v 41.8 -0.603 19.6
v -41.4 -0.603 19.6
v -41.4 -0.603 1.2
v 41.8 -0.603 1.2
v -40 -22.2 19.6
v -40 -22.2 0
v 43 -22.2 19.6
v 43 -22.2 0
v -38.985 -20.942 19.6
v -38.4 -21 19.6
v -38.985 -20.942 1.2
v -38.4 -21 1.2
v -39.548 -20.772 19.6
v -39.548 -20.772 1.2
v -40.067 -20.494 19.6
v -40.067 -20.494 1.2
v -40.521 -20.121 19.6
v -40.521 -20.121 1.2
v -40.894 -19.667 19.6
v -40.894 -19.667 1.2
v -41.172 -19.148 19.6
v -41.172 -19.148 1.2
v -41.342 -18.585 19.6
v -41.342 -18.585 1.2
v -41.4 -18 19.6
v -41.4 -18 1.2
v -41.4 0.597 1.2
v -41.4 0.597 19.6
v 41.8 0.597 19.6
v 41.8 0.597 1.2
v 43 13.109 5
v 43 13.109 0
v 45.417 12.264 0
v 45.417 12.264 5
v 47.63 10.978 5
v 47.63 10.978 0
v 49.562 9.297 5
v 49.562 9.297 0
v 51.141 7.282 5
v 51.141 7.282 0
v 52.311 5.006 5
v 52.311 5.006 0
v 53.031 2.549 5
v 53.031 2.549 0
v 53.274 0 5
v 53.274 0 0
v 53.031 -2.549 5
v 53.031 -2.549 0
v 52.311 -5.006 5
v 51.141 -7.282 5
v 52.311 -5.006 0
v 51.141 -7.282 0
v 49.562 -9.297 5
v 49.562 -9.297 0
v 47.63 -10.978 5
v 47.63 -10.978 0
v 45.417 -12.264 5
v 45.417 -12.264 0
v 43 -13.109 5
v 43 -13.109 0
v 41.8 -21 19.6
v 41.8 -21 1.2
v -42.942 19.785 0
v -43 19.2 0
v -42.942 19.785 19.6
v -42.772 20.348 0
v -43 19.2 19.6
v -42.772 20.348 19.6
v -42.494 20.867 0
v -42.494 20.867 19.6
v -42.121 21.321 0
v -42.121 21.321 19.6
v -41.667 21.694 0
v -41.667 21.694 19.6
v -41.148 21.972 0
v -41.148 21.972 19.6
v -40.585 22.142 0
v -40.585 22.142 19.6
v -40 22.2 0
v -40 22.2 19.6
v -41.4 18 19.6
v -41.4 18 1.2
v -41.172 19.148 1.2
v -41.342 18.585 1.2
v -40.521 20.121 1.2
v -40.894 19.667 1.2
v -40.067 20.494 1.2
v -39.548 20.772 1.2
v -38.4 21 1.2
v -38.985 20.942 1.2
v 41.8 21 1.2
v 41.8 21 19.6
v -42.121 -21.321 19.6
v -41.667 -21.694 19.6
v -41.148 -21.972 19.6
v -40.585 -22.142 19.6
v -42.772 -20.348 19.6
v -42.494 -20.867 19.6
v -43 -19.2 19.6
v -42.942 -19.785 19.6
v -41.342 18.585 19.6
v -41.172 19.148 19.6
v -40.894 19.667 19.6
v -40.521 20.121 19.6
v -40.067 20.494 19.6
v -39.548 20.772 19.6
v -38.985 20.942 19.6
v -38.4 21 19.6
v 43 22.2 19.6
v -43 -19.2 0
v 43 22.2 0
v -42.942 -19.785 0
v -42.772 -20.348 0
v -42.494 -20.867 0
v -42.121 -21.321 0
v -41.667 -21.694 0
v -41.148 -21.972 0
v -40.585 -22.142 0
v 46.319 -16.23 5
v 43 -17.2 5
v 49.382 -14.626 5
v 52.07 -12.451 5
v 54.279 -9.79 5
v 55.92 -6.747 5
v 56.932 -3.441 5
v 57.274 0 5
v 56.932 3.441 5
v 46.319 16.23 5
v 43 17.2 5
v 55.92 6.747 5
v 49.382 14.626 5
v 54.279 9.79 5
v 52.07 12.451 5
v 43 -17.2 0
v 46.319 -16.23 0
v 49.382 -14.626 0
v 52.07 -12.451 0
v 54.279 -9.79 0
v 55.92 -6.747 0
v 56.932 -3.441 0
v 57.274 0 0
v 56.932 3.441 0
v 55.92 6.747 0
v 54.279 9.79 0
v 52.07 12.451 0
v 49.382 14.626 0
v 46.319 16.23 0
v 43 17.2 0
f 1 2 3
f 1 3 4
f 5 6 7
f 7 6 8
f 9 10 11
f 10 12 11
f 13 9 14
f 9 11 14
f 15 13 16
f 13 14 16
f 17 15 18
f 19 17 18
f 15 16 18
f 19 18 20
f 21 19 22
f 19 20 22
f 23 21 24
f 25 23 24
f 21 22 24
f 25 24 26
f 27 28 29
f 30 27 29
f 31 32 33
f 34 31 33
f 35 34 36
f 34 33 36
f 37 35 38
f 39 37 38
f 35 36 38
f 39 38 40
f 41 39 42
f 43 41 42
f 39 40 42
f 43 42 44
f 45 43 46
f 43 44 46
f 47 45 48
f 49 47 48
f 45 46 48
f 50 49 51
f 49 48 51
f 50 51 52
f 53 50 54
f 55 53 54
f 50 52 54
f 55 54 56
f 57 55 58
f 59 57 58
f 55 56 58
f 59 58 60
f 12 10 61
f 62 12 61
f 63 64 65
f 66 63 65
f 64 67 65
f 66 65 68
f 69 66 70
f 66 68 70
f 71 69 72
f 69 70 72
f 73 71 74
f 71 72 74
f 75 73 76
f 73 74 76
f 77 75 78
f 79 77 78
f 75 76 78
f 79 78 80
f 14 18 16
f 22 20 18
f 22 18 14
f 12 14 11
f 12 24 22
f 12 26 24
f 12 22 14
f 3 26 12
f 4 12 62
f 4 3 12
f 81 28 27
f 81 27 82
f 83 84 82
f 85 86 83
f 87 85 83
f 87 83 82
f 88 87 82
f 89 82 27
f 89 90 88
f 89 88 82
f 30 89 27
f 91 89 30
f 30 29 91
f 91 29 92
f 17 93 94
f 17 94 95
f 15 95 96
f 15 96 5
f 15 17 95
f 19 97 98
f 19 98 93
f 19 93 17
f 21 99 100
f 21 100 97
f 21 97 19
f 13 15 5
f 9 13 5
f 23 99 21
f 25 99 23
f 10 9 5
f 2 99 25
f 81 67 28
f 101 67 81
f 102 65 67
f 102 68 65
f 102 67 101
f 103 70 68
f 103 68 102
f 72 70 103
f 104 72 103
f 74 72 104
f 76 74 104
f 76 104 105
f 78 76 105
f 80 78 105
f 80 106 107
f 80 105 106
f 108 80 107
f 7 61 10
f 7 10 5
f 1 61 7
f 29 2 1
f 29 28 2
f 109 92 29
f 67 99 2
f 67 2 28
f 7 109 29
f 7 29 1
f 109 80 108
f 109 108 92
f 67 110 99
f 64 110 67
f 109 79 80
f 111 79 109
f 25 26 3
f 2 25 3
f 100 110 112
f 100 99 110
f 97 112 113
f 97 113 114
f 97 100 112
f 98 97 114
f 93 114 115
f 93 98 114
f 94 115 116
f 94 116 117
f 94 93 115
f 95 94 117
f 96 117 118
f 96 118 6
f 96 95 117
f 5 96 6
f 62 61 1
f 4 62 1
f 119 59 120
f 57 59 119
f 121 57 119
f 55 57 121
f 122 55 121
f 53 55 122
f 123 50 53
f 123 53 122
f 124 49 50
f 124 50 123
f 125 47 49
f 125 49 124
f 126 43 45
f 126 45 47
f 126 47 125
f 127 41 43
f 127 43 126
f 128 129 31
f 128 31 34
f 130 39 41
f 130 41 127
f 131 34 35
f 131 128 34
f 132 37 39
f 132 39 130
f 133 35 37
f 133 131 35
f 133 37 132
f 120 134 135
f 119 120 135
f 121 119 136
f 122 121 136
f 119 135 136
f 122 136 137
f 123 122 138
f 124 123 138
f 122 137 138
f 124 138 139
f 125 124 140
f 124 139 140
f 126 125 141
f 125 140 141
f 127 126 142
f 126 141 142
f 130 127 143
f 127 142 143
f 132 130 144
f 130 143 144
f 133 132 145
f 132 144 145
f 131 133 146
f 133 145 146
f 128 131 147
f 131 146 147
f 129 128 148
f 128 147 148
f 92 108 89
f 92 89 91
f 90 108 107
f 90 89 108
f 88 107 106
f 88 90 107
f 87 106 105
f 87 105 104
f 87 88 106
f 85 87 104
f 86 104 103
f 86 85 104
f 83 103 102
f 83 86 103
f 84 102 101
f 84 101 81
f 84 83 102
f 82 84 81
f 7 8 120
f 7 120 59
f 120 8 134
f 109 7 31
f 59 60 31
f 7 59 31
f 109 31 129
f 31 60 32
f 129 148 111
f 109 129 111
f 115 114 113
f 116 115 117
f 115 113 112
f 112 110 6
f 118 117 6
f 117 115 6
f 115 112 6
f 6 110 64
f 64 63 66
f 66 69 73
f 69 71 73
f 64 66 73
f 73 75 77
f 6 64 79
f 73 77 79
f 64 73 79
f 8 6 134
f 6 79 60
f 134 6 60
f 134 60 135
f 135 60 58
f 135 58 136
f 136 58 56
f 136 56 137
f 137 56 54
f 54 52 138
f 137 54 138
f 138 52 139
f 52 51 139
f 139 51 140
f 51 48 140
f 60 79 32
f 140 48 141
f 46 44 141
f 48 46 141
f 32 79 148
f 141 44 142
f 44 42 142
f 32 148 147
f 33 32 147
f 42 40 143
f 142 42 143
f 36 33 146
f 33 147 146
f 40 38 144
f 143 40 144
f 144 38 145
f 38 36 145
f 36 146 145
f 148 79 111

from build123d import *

# Parameters (mm, degrees)
SKETCH_1_W          = 86
SKETCH_1_H          = 44.4
EXTRUDE_1_DEPTH     = 19.6
EXTRUDE_2_DEPTH     = 5
SKETCH_3_W          = 83.2
SKETCH_3_H          = 20.402884615
SKETCH_3_H_2        = 20.397115385
CUT_EXTRUDE_1_DEPTH = 18.4
FILLET_1_R          = 3


with BuildPart() as part:
    # Эскиз1 → Бобышка-Вытянуть1 (new body)
    with BuildSketch(Plane.XY):
        Rectangle(SKETCH_1_W, SKETCH_1_H)
    extrude(amount=EXTRUDE_1_DEPTH)

    # Эскиз2 → Бобышка-Вытянуть2 (add)
    with BuildSketch(Plane.XY):
        with BuildLine():
            Line((43, 17.2), (43, 13.108775687))
            ThreePointArc((43, 13.108775687), (53.273546839, 0), (43, -13.108775687))
            Line((43, -13.108775687), (43, -17.2))
            ThreePointArc((43, -17.2), (57.273546839, 0), (43, 17.2))
        make_face()
    extrude(amount=EXTRUDE_2_DEPTH)

    # Эскиз3 → Вырез-Вытянуть1 (cut)
    with BuildSketch(Plane.XY.offset(19.6)):
        with Locations((0.2, 10.798557692)):
            Rectangle(SKETCH_3_W, SKETCH_3_H)
        with Locations((0.2, -10.801442308)):
            Rectangle(SKETCH_3_W, SKETCH_3_H_2)
    extrude(amount=-CUT_EXTRUDE_1_DEPTH, mode=Mode.SUBTRACT)

    # Скругление1
    fillet_1_edges = [part.edges().sort_by_distance(p)[0] for p in [
        (-41.4, 21, 10.4),
        (-41.4, -21, 10.4),
        (-43, -22.2, 9.8),
        (-43, 22.2, 9.8),
    ]]
    fillet(fillet_1_edges, radius=FILLET_1_R)


solid = part.part
